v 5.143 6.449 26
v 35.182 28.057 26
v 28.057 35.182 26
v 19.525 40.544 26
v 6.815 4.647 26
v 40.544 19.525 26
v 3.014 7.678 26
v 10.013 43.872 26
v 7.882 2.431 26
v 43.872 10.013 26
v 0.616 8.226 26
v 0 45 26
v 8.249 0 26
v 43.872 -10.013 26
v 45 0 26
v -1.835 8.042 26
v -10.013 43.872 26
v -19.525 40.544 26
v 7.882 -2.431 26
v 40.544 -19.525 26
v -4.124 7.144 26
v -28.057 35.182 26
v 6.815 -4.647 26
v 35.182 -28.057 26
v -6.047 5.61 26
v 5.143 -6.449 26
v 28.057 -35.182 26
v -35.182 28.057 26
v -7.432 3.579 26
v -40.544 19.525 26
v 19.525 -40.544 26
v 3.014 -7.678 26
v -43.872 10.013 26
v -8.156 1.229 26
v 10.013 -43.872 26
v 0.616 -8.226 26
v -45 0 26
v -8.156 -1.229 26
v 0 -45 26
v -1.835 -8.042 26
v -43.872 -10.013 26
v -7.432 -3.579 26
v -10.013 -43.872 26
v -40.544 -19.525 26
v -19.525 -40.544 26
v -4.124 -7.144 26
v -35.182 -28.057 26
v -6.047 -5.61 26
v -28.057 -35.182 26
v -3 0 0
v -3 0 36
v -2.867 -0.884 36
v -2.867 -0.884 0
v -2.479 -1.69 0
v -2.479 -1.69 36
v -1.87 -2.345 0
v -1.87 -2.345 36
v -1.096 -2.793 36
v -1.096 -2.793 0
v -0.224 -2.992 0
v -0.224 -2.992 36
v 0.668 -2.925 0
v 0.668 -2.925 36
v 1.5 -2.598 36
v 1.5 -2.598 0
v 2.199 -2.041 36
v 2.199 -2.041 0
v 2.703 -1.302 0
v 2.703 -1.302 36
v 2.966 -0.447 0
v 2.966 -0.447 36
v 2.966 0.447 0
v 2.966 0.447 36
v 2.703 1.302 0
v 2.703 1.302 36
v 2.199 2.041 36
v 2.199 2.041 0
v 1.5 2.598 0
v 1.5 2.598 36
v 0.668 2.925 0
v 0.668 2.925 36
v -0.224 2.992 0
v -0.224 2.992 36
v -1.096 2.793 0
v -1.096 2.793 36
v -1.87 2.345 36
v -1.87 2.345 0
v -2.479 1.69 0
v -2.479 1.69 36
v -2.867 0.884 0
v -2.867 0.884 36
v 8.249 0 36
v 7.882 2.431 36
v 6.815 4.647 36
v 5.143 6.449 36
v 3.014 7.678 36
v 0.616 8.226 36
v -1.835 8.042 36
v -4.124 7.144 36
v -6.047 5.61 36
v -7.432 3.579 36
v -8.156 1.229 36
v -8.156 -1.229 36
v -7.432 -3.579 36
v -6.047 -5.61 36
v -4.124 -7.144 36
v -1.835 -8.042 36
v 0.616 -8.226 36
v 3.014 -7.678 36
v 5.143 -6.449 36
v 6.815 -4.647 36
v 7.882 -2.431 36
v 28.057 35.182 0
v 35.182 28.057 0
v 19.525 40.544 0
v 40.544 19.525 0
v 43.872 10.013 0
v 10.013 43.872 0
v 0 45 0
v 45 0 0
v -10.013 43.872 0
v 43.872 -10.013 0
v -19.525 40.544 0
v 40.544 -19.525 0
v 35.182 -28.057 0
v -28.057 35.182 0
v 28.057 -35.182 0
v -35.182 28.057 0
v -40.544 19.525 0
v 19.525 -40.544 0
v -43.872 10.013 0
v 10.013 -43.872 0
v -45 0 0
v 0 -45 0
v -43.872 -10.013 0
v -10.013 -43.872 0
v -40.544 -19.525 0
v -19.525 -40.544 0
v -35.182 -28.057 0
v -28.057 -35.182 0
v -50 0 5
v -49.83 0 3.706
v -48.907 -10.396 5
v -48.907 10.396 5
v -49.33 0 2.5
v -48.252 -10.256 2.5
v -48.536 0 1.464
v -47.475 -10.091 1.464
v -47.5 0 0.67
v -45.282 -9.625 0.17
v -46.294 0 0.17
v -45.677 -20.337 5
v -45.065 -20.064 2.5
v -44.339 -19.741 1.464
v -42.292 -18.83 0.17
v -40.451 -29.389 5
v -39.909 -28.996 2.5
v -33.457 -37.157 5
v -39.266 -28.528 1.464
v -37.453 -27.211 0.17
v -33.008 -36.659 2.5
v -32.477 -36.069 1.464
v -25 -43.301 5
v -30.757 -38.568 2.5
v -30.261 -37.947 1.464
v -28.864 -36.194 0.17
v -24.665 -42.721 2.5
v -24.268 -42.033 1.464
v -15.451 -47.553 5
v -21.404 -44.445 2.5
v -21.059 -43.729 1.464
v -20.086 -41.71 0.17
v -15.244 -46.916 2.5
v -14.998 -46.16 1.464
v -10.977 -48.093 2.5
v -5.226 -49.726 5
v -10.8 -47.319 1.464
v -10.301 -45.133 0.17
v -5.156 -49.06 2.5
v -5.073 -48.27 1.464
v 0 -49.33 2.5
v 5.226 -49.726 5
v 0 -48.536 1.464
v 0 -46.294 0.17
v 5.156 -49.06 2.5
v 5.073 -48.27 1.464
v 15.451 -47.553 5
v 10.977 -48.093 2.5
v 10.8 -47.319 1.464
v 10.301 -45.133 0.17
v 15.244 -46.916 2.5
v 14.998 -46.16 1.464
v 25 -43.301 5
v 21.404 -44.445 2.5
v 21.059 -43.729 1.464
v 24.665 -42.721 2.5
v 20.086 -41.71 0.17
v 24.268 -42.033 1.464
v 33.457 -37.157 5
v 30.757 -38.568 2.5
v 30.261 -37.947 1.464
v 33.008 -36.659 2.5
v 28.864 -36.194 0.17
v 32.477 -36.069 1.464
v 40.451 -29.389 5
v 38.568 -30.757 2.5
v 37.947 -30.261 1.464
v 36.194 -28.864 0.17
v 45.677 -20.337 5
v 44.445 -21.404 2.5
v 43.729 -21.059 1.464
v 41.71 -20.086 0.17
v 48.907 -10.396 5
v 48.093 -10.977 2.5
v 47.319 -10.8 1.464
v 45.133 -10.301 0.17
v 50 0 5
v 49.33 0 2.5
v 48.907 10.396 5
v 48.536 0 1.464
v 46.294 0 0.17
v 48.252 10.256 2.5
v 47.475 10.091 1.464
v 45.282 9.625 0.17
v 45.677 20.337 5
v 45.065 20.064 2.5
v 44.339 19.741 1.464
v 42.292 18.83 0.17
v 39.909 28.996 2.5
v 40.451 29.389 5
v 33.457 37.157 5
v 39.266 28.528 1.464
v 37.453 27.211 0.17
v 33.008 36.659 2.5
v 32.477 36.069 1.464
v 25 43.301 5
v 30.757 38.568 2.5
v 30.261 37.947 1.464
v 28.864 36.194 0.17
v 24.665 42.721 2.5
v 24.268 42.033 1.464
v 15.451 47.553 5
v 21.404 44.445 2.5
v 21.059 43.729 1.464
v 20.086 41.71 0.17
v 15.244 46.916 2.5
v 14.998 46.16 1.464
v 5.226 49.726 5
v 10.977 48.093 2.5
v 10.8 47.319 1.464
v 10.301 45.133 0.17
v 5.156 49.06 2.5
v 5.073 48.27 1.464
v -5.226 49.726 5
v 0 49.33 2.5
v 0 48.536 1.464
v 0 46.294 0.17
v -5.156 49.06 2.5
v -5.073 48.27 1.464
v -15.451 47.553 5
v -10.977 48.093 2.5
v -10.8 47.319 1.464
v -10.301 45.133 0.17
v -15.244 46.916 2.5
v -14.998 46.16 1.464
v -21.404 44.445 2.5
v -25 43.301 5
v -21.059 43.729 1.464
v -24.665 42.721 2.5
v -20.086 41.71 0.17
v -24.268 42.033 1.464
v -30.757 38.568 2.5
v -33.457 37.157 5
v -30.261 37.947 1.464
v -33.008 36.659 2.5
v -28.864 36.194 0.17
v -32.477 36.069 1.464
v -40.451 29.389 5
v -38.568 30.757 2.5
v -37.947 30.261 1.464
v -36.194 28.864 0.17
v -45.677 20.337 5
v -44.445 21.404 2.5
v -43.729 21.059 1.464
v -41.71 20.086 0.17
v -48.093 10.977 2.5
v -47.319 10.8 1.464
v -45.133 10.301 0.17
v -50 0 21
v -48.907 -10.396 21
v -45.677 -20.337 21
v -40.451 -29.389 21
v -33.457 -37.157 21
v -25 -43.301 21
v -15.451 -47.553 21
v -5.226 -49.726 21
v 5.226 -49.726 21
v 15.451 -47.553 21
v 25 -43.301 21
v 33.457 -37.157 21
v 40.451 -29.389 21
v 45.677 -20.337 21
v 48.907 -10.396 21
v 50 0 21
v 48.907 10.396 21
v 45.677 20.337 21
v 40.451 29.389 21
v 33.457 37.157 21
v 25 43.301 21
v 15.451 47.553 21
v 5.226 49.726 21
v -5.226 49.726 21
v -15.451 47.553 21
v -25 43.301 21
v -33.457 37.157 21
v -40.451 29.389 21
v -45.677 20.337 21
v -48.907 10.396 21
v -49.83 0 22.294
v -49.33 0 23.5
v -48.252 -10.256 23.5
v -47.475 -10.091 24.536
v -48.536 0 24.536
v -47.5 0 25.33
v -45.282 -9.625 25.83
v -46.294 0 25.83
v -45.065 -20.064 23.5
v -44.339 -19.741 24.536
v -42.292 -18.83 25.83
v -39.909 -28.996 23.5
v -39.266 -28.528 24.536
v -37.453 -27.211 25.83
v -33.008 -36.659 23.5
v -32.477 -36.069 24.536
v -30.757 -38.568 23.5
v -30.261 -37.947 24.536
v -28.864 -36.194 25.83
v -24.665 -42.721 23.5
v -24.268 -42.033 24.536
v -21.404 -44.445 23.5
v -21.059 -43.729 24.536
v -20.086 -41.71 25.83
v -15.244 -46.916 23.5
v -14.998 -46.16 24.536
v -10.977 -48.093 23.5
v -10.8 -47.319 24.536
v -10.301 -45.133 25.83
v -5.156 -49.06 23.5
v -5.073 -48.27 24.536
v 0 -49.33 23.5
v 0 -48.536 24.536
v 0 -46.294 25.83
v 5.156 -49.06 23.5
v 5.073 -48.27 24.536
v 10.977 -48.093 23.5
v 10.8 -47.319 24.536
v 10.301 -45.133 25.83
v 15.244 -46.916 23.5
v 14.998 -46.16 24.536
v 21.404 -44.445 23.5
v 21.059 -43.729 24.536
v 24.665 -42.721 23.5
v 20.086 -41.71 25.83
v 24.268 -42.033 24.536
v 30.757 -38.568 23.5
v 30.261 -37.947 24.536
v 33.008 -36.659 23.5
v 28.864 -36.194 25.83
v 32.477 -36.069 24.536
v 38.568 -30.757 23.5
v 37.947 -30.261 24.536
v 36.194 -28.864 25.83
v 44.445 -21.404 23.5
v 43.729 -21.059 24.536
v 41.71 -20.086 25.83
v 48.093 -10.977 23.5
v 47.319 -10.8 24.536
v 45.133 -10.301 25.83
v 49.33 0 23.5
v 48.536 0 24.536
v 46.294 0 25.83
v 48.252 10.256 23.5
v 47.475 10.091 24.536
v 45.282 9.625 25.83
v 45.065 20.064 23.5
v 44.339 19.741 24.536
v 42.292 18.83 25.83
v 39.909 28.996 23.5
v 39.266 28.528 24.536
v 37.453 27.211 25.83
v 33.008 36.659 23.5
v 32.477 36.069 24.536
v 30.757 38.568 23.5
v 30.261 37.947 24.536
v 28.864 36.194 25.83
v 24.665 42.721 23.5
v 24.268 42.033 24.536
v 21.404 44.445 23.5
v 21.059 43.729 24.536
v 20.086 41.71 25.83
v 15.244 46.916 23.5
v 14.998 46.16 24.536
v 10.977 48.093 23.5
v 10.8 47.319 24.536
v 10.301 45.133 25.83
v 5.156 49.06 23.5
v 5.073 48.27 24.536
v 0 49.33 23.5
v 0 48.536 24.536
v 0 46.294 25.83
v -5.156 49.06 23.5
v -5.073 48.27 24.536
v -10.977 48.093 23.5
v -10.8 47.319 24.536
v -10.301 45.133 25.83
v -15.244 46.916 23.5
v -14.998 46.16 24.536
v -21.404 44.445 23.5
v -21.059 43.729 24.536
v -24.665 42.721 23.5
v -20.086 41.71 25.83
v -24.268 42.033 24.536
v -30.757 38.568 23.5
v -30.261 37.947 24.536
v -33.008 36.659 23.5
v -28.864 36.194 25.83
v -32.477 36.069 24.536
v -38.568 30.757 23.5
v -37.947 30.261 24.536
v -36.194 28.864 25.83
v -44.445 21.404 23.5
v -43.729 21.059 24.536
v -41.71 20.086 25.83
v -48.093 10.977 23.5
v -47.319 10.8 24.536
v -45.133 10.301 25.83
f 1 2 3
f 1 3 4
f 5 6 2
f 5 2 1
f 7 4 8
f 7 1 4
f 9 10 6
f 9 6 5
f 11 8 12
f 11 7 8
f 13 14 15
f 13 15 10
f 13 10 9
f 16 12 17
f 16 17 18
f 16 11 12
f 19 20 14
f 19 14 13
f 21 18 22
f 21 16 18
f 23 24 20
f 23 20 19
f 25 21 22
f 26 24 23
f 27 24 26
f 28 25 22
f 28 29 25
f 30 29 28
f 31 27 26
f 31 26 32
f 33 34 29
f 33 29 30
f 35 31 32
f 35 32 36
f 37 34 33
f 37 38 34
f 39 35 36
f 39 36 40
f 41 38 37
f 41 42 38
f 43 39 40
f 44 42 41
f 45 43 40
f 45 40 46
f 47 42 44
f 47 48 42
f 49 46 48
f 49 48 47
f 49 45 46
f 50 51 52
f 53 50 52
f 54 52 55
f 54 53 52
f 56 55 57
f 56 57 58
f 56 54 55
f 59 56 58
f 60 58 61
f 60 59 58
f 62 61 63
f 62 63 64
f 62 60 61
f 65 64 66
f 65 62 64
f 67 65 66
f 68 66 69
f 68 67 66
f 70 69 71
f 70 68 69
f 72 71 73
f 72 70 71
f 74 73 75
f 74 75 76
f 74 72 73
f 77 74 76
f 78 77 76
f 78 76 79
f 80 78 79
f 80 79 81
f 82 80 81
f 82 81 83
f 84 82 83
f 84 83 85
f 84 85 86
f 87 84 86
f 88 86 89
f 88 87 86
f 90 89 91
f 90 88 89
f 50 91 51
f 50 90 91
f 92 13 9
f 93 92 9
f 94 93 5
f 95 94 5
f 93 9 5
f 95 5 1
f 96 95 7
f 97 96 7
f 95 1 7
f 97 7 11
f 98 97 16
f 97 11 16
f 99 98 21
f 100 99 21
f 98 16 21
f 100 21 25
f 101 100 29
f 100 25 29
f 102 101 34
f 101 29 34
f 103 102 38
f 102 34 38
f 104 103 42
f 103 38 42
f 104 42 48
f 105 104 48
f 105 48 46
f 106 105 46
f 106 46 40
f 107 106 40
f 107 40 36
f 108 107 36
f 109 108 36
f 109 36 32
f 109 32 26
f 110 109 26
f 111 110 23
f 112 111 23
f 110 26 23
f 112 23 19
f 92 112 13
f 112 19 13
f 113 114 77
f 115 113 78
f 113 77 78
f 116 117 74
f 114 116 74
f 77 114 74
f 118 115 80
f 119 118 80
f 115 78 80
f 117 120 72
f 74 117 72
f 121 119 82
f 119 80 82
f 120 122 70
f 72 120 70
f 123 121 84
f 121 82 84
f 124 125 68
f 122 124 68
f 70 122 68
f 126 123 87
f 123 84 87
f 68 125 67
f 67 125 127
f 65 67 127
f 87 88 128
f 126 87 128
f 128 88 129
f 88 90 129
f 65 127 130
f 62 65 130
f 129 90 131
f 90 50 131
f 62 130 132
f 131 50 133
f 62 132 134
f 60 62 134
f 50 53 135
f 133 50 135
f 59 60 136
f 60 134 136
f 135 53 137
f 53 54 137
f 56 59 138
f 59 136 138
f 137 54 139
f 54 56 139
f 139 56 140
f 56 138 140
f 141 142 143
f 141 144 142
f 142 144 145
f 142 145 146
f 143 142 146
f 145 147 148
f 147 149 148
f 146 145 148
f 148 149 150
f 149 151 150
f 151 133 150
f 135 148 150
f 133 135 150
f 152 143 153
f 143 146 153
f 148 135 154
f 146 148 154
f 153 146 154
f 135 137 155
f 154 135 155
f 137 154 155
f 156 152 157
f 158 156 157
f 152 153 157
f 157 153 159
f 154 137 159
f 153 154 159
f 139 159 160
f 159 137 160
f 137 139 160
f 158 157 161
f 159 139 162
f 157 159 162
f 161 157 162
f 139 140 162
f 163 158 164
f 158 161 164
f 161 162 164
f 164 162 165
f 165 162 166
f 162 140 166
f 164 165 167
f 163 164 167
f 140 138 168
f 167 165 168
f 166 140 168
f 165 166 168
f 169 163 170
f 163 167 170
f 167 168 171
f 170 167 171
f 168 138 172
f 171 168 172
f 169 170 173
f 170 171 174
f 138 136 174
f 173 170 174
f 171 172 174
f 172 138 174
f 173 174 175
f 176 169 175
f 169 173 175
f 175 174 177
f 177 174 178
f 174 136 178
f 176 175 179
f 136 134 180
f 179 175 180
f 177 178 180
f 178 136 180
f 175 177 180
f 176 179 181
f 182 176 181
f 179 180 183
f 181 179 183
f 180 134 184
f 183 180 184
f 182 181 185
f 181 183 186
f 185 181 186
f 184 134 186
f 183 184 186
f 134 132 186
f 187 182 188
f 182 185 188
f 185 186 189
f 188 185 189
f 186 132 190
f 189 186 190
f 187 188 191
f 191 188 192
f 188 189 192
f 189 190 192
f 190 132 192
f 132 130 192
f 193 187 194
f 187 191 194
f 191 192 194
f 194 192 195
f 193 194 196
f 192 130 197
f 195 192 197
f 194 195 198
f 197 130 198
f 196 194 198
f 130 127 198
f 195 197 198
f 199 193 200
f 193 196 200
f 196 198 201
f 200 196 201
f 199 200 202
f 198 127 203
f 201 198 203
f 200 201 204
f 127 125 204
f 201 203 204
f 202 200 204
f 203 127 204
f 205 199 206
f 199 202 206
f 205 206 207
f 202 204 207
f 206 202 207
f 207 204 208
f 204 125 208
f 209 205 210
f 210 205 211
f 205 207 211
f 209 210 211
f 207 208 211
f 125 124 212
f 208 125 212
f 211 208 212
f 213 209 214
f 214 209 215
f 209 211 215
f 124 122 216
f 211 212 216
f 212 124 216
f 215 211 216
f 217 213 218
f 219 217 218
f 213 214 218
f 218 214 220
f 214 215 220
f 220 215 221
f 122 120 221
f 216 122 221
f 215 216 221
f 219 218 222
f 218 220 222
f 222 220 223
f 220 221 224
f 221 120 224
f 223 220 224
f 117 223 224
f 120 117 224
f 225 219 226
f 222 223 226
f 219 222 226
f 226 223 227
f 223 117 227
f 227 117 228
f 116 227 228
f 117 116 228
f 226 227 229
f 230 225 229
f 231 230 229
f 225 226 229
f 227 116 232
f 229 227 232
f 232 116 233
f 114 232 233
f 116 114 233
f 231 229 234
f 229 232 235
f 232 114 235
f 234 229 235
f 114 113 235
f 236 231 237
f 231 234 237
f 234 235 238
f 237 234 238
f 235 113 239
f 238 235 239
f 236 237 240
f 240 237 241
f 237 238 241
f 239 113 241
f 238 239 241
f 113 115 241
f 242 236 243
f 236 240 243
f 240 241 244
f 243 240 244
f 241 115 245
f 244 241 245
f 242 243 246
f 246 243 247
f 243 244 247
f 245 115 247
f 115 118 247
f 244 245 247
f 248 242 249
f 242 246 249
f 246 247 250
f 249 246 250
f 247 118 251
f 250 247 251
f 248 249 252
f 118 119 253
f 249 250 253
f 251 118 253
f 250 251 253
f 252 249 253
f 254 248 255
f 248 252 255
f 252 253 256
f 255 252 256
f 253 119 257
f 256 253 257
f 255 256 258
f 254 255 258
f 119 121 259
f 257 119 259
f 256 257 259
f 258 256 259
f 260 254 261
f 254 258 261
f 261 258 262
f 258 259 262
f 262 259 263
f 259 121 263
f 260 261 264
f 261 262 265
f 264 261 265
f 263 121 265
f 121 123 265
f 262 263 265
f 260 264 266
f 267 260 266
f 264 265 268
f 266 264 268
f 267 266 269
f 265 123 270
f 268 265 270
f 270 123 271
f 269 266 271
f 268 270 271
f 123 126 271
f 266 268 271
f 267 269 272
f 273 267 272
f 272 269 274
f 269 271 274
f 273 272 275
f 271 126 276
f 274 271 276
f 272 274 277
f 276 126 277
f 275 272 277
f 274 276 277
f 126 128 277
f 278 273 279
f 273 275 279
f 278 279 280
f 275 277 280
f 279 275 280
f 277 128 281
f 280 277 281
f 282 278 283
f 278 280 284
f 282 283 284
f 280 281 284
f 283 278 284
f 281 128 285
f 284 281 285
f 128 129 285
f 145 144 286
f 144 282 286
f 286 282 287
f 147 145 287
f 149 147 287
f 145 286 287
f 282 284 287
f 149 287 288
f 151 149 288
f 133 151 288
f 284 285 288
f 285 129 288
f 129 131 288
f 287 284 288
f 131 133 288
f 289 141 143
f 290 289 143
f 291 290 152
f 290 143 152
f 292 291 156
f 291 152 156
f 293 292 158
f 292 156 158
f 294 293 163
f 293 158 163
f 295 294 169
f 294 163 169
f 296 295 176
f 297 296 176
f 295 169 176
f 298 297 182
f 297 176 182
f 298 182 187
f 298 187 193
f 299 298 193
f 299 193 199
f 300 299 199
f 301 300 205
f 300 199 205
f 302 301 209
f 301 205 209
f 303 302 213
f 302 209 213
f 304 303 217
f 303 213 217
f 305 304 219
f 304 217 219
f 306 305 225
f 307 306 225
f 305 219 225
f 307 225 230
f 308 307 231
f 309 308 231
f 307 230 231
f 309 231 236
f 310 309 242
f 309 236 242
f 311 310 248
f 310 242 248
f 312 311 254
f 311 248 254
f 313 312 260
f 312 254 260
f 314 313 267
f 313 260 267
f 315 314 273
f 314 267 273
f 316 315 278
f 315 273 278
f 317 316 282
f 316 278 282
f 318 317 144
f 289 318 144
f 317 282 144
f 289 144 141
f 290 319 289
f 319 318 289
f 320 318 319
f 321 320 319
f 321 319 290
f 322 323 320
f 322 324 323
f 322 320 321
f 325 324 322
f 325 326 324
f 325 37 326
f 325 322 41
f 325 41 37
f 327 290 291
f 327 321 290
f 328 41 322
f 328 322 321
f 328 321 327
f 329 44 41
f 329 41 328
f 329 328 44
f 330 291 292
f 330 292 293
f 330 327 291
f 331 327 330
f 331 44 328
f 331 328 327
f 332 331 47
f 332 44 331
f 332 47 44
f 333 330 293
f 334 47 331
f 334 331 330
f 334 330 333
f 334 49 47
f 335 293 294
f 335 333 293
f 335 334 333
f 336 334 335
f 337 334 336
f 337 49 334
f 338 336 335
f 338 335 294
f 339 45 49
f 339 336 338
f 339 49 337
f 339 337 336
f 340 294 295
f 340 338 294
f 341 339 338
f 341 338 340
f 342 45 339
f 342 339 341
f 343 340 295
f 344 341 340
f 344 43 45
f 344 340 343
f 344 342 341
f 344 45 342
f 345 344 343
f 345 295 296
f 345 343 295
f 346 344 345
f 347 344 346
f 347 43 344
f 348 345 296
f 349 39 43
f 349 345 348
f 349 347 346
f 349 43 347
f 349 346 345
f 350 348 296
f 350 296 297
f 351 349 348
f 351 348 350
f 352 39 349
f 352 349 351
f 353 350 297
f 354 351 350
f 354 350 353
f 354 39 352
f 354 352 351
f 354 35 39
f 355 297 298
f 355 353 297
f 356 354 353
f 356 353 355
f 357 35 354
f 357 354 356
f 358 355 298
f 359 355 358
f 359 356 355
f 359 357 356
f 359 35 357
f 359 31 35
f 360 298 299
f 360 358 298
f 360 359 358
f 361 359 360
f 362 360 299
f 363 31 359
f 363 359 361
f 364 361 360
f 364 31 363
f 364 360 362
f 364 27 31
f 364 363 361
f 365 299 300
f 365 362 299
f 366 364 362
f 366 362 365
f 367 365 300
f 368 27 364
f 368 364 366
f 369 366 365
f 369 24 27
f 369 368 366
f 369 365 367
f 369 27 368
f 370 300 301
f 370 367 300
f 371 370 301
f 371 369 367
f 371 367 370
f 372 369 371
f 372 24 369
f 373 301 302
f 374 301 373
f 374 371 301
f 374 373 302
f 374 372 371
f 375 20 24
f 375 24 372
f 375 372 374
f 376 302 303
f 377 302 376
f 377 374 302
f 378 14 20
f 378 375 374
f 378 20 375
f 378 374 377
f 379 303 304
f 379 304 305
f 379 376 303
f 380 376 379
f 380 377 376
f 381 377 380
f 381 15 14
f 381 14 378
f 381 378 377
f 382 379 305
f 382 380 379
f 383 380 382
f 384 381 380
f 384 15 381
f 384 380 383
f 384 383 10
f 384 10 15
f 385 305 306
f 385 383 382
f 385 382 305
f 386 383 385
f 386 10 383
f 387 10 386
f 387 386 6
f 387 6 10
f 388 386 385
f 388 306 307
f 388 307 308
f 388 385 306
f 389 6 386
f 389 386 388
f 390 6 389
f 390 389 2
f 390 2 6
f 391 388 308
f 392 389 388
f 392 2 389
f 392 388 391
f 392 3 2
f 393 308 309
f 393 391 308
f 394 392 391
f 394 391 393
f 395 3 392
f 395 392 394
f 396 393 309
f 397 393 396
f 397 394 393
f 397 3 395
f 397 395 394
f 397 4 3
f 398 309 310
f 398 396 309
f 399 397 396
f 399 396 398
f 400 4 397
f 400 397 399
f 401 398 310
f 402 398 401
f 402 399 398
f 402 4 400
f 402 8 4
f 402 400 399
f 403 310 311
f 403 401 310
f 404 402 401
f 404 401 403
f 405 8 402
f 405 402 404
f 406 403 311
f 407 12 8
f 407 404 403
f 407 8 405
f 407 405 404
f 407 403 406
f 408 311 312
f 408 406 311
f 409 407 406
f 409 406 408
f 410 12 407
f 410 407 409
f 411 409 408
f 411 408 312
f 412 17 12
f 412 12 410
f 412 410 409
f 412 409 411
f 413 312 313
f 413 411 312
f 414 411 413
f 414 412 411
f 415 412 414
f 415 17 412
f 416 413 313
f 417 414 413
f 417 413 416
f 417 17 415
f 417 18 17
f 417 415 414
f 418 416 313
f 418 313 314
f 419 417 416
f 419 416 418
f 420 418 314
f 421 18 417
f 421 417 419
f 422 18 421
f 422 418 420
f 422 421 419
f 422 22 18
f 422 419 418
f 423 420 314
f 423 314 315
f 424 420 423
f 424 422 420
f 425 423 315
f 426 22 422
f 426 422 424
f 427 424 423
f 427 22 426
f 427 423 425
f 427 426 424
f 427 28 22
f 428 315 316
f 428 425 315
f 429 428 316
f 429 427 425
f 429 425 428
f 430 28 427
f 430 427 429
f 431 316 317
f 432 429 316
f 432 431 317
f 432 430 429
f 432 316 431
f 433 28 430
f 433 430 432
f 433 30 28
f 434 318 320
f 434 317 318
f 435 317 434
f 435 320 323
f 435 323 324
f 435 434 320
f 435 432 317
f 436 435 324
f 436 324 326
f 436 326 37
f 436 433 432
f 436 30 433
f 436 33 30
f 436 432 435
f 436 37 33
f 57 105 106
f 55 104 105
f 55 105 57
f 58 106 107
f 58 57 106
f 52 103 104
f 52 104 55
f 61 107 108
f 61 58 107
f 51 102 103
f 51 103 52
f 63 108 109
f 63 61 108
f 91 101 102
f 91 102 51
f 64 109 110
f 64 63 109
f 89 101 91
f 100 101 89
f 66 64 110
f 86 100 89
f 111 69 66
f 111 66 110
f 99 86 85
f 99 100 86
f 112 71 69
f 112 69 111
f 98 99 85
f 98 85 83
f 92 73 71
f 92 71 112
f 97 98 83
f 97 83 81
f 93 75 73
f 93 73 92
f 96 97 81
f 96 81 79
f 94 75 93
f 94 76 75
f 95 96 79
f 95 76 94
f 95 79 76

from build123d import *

# Parameters (mm, degrees)
SKETCH1_R           = 50
SKETCH1_R_2         = 3
BOSS_EXTRUDE1_DEPTH = 26
FILLET2_R           = 5
SKETCH3_R           = 8.248611849
BOSS_EXTRUDE2_DEPTH = 10
CUT_EXTRUDE1_START  = -26
SKETCH4_R           = 3
CUT_EXTRUDE1_DEPTH  = 26


with BuildPart() as part:
    # Sketch1 → Boss-Extrude1 (new body)
    with BuildSketch(Plane.XY):
        with Locations(Location((0, 0, 0), (0, 0, 180))):
            Circle(SKETCH1_R)
        with Locations(Location((0, 0, 0), (0, 0, 180))):
            Circle(SKETCH1_R_2, mode=Mode.SUBTRACT)
    extrude(amount=BOSS_EXTRUDE1_DEPTH)

    # Fillet2
    fillet2_edges = [part.edges().sort_by_distance(p)[0] for p in [
        (50, 0, 0),
        (50, 0, 26),
    ]]
    fillet(fillet2_edges, radius=FILLET2_R)

    # Sketch3 → Boss-Extrude2 (add)
    with BuildSketch(Plane.XY.offset(26)):
        Circle(SKETCH3_R)
    extrude(amount=BOSS_EXTRUDE2_DEPTH)

    # Sketch4 → Cut-Extrude1 (cut)
    with BuildSketch(Plane.XY.offset(36).offset(CUT_EXTRUDE1_START)):
        with Locations(Location((0, 0, 0), (0, 0, 180))):
            Circle(SKETCH4_R)
    extrude(amount=CUT_EXTRUDE1_DEPTH, mode=Mode.SUBTRACT)


solid = part.part
